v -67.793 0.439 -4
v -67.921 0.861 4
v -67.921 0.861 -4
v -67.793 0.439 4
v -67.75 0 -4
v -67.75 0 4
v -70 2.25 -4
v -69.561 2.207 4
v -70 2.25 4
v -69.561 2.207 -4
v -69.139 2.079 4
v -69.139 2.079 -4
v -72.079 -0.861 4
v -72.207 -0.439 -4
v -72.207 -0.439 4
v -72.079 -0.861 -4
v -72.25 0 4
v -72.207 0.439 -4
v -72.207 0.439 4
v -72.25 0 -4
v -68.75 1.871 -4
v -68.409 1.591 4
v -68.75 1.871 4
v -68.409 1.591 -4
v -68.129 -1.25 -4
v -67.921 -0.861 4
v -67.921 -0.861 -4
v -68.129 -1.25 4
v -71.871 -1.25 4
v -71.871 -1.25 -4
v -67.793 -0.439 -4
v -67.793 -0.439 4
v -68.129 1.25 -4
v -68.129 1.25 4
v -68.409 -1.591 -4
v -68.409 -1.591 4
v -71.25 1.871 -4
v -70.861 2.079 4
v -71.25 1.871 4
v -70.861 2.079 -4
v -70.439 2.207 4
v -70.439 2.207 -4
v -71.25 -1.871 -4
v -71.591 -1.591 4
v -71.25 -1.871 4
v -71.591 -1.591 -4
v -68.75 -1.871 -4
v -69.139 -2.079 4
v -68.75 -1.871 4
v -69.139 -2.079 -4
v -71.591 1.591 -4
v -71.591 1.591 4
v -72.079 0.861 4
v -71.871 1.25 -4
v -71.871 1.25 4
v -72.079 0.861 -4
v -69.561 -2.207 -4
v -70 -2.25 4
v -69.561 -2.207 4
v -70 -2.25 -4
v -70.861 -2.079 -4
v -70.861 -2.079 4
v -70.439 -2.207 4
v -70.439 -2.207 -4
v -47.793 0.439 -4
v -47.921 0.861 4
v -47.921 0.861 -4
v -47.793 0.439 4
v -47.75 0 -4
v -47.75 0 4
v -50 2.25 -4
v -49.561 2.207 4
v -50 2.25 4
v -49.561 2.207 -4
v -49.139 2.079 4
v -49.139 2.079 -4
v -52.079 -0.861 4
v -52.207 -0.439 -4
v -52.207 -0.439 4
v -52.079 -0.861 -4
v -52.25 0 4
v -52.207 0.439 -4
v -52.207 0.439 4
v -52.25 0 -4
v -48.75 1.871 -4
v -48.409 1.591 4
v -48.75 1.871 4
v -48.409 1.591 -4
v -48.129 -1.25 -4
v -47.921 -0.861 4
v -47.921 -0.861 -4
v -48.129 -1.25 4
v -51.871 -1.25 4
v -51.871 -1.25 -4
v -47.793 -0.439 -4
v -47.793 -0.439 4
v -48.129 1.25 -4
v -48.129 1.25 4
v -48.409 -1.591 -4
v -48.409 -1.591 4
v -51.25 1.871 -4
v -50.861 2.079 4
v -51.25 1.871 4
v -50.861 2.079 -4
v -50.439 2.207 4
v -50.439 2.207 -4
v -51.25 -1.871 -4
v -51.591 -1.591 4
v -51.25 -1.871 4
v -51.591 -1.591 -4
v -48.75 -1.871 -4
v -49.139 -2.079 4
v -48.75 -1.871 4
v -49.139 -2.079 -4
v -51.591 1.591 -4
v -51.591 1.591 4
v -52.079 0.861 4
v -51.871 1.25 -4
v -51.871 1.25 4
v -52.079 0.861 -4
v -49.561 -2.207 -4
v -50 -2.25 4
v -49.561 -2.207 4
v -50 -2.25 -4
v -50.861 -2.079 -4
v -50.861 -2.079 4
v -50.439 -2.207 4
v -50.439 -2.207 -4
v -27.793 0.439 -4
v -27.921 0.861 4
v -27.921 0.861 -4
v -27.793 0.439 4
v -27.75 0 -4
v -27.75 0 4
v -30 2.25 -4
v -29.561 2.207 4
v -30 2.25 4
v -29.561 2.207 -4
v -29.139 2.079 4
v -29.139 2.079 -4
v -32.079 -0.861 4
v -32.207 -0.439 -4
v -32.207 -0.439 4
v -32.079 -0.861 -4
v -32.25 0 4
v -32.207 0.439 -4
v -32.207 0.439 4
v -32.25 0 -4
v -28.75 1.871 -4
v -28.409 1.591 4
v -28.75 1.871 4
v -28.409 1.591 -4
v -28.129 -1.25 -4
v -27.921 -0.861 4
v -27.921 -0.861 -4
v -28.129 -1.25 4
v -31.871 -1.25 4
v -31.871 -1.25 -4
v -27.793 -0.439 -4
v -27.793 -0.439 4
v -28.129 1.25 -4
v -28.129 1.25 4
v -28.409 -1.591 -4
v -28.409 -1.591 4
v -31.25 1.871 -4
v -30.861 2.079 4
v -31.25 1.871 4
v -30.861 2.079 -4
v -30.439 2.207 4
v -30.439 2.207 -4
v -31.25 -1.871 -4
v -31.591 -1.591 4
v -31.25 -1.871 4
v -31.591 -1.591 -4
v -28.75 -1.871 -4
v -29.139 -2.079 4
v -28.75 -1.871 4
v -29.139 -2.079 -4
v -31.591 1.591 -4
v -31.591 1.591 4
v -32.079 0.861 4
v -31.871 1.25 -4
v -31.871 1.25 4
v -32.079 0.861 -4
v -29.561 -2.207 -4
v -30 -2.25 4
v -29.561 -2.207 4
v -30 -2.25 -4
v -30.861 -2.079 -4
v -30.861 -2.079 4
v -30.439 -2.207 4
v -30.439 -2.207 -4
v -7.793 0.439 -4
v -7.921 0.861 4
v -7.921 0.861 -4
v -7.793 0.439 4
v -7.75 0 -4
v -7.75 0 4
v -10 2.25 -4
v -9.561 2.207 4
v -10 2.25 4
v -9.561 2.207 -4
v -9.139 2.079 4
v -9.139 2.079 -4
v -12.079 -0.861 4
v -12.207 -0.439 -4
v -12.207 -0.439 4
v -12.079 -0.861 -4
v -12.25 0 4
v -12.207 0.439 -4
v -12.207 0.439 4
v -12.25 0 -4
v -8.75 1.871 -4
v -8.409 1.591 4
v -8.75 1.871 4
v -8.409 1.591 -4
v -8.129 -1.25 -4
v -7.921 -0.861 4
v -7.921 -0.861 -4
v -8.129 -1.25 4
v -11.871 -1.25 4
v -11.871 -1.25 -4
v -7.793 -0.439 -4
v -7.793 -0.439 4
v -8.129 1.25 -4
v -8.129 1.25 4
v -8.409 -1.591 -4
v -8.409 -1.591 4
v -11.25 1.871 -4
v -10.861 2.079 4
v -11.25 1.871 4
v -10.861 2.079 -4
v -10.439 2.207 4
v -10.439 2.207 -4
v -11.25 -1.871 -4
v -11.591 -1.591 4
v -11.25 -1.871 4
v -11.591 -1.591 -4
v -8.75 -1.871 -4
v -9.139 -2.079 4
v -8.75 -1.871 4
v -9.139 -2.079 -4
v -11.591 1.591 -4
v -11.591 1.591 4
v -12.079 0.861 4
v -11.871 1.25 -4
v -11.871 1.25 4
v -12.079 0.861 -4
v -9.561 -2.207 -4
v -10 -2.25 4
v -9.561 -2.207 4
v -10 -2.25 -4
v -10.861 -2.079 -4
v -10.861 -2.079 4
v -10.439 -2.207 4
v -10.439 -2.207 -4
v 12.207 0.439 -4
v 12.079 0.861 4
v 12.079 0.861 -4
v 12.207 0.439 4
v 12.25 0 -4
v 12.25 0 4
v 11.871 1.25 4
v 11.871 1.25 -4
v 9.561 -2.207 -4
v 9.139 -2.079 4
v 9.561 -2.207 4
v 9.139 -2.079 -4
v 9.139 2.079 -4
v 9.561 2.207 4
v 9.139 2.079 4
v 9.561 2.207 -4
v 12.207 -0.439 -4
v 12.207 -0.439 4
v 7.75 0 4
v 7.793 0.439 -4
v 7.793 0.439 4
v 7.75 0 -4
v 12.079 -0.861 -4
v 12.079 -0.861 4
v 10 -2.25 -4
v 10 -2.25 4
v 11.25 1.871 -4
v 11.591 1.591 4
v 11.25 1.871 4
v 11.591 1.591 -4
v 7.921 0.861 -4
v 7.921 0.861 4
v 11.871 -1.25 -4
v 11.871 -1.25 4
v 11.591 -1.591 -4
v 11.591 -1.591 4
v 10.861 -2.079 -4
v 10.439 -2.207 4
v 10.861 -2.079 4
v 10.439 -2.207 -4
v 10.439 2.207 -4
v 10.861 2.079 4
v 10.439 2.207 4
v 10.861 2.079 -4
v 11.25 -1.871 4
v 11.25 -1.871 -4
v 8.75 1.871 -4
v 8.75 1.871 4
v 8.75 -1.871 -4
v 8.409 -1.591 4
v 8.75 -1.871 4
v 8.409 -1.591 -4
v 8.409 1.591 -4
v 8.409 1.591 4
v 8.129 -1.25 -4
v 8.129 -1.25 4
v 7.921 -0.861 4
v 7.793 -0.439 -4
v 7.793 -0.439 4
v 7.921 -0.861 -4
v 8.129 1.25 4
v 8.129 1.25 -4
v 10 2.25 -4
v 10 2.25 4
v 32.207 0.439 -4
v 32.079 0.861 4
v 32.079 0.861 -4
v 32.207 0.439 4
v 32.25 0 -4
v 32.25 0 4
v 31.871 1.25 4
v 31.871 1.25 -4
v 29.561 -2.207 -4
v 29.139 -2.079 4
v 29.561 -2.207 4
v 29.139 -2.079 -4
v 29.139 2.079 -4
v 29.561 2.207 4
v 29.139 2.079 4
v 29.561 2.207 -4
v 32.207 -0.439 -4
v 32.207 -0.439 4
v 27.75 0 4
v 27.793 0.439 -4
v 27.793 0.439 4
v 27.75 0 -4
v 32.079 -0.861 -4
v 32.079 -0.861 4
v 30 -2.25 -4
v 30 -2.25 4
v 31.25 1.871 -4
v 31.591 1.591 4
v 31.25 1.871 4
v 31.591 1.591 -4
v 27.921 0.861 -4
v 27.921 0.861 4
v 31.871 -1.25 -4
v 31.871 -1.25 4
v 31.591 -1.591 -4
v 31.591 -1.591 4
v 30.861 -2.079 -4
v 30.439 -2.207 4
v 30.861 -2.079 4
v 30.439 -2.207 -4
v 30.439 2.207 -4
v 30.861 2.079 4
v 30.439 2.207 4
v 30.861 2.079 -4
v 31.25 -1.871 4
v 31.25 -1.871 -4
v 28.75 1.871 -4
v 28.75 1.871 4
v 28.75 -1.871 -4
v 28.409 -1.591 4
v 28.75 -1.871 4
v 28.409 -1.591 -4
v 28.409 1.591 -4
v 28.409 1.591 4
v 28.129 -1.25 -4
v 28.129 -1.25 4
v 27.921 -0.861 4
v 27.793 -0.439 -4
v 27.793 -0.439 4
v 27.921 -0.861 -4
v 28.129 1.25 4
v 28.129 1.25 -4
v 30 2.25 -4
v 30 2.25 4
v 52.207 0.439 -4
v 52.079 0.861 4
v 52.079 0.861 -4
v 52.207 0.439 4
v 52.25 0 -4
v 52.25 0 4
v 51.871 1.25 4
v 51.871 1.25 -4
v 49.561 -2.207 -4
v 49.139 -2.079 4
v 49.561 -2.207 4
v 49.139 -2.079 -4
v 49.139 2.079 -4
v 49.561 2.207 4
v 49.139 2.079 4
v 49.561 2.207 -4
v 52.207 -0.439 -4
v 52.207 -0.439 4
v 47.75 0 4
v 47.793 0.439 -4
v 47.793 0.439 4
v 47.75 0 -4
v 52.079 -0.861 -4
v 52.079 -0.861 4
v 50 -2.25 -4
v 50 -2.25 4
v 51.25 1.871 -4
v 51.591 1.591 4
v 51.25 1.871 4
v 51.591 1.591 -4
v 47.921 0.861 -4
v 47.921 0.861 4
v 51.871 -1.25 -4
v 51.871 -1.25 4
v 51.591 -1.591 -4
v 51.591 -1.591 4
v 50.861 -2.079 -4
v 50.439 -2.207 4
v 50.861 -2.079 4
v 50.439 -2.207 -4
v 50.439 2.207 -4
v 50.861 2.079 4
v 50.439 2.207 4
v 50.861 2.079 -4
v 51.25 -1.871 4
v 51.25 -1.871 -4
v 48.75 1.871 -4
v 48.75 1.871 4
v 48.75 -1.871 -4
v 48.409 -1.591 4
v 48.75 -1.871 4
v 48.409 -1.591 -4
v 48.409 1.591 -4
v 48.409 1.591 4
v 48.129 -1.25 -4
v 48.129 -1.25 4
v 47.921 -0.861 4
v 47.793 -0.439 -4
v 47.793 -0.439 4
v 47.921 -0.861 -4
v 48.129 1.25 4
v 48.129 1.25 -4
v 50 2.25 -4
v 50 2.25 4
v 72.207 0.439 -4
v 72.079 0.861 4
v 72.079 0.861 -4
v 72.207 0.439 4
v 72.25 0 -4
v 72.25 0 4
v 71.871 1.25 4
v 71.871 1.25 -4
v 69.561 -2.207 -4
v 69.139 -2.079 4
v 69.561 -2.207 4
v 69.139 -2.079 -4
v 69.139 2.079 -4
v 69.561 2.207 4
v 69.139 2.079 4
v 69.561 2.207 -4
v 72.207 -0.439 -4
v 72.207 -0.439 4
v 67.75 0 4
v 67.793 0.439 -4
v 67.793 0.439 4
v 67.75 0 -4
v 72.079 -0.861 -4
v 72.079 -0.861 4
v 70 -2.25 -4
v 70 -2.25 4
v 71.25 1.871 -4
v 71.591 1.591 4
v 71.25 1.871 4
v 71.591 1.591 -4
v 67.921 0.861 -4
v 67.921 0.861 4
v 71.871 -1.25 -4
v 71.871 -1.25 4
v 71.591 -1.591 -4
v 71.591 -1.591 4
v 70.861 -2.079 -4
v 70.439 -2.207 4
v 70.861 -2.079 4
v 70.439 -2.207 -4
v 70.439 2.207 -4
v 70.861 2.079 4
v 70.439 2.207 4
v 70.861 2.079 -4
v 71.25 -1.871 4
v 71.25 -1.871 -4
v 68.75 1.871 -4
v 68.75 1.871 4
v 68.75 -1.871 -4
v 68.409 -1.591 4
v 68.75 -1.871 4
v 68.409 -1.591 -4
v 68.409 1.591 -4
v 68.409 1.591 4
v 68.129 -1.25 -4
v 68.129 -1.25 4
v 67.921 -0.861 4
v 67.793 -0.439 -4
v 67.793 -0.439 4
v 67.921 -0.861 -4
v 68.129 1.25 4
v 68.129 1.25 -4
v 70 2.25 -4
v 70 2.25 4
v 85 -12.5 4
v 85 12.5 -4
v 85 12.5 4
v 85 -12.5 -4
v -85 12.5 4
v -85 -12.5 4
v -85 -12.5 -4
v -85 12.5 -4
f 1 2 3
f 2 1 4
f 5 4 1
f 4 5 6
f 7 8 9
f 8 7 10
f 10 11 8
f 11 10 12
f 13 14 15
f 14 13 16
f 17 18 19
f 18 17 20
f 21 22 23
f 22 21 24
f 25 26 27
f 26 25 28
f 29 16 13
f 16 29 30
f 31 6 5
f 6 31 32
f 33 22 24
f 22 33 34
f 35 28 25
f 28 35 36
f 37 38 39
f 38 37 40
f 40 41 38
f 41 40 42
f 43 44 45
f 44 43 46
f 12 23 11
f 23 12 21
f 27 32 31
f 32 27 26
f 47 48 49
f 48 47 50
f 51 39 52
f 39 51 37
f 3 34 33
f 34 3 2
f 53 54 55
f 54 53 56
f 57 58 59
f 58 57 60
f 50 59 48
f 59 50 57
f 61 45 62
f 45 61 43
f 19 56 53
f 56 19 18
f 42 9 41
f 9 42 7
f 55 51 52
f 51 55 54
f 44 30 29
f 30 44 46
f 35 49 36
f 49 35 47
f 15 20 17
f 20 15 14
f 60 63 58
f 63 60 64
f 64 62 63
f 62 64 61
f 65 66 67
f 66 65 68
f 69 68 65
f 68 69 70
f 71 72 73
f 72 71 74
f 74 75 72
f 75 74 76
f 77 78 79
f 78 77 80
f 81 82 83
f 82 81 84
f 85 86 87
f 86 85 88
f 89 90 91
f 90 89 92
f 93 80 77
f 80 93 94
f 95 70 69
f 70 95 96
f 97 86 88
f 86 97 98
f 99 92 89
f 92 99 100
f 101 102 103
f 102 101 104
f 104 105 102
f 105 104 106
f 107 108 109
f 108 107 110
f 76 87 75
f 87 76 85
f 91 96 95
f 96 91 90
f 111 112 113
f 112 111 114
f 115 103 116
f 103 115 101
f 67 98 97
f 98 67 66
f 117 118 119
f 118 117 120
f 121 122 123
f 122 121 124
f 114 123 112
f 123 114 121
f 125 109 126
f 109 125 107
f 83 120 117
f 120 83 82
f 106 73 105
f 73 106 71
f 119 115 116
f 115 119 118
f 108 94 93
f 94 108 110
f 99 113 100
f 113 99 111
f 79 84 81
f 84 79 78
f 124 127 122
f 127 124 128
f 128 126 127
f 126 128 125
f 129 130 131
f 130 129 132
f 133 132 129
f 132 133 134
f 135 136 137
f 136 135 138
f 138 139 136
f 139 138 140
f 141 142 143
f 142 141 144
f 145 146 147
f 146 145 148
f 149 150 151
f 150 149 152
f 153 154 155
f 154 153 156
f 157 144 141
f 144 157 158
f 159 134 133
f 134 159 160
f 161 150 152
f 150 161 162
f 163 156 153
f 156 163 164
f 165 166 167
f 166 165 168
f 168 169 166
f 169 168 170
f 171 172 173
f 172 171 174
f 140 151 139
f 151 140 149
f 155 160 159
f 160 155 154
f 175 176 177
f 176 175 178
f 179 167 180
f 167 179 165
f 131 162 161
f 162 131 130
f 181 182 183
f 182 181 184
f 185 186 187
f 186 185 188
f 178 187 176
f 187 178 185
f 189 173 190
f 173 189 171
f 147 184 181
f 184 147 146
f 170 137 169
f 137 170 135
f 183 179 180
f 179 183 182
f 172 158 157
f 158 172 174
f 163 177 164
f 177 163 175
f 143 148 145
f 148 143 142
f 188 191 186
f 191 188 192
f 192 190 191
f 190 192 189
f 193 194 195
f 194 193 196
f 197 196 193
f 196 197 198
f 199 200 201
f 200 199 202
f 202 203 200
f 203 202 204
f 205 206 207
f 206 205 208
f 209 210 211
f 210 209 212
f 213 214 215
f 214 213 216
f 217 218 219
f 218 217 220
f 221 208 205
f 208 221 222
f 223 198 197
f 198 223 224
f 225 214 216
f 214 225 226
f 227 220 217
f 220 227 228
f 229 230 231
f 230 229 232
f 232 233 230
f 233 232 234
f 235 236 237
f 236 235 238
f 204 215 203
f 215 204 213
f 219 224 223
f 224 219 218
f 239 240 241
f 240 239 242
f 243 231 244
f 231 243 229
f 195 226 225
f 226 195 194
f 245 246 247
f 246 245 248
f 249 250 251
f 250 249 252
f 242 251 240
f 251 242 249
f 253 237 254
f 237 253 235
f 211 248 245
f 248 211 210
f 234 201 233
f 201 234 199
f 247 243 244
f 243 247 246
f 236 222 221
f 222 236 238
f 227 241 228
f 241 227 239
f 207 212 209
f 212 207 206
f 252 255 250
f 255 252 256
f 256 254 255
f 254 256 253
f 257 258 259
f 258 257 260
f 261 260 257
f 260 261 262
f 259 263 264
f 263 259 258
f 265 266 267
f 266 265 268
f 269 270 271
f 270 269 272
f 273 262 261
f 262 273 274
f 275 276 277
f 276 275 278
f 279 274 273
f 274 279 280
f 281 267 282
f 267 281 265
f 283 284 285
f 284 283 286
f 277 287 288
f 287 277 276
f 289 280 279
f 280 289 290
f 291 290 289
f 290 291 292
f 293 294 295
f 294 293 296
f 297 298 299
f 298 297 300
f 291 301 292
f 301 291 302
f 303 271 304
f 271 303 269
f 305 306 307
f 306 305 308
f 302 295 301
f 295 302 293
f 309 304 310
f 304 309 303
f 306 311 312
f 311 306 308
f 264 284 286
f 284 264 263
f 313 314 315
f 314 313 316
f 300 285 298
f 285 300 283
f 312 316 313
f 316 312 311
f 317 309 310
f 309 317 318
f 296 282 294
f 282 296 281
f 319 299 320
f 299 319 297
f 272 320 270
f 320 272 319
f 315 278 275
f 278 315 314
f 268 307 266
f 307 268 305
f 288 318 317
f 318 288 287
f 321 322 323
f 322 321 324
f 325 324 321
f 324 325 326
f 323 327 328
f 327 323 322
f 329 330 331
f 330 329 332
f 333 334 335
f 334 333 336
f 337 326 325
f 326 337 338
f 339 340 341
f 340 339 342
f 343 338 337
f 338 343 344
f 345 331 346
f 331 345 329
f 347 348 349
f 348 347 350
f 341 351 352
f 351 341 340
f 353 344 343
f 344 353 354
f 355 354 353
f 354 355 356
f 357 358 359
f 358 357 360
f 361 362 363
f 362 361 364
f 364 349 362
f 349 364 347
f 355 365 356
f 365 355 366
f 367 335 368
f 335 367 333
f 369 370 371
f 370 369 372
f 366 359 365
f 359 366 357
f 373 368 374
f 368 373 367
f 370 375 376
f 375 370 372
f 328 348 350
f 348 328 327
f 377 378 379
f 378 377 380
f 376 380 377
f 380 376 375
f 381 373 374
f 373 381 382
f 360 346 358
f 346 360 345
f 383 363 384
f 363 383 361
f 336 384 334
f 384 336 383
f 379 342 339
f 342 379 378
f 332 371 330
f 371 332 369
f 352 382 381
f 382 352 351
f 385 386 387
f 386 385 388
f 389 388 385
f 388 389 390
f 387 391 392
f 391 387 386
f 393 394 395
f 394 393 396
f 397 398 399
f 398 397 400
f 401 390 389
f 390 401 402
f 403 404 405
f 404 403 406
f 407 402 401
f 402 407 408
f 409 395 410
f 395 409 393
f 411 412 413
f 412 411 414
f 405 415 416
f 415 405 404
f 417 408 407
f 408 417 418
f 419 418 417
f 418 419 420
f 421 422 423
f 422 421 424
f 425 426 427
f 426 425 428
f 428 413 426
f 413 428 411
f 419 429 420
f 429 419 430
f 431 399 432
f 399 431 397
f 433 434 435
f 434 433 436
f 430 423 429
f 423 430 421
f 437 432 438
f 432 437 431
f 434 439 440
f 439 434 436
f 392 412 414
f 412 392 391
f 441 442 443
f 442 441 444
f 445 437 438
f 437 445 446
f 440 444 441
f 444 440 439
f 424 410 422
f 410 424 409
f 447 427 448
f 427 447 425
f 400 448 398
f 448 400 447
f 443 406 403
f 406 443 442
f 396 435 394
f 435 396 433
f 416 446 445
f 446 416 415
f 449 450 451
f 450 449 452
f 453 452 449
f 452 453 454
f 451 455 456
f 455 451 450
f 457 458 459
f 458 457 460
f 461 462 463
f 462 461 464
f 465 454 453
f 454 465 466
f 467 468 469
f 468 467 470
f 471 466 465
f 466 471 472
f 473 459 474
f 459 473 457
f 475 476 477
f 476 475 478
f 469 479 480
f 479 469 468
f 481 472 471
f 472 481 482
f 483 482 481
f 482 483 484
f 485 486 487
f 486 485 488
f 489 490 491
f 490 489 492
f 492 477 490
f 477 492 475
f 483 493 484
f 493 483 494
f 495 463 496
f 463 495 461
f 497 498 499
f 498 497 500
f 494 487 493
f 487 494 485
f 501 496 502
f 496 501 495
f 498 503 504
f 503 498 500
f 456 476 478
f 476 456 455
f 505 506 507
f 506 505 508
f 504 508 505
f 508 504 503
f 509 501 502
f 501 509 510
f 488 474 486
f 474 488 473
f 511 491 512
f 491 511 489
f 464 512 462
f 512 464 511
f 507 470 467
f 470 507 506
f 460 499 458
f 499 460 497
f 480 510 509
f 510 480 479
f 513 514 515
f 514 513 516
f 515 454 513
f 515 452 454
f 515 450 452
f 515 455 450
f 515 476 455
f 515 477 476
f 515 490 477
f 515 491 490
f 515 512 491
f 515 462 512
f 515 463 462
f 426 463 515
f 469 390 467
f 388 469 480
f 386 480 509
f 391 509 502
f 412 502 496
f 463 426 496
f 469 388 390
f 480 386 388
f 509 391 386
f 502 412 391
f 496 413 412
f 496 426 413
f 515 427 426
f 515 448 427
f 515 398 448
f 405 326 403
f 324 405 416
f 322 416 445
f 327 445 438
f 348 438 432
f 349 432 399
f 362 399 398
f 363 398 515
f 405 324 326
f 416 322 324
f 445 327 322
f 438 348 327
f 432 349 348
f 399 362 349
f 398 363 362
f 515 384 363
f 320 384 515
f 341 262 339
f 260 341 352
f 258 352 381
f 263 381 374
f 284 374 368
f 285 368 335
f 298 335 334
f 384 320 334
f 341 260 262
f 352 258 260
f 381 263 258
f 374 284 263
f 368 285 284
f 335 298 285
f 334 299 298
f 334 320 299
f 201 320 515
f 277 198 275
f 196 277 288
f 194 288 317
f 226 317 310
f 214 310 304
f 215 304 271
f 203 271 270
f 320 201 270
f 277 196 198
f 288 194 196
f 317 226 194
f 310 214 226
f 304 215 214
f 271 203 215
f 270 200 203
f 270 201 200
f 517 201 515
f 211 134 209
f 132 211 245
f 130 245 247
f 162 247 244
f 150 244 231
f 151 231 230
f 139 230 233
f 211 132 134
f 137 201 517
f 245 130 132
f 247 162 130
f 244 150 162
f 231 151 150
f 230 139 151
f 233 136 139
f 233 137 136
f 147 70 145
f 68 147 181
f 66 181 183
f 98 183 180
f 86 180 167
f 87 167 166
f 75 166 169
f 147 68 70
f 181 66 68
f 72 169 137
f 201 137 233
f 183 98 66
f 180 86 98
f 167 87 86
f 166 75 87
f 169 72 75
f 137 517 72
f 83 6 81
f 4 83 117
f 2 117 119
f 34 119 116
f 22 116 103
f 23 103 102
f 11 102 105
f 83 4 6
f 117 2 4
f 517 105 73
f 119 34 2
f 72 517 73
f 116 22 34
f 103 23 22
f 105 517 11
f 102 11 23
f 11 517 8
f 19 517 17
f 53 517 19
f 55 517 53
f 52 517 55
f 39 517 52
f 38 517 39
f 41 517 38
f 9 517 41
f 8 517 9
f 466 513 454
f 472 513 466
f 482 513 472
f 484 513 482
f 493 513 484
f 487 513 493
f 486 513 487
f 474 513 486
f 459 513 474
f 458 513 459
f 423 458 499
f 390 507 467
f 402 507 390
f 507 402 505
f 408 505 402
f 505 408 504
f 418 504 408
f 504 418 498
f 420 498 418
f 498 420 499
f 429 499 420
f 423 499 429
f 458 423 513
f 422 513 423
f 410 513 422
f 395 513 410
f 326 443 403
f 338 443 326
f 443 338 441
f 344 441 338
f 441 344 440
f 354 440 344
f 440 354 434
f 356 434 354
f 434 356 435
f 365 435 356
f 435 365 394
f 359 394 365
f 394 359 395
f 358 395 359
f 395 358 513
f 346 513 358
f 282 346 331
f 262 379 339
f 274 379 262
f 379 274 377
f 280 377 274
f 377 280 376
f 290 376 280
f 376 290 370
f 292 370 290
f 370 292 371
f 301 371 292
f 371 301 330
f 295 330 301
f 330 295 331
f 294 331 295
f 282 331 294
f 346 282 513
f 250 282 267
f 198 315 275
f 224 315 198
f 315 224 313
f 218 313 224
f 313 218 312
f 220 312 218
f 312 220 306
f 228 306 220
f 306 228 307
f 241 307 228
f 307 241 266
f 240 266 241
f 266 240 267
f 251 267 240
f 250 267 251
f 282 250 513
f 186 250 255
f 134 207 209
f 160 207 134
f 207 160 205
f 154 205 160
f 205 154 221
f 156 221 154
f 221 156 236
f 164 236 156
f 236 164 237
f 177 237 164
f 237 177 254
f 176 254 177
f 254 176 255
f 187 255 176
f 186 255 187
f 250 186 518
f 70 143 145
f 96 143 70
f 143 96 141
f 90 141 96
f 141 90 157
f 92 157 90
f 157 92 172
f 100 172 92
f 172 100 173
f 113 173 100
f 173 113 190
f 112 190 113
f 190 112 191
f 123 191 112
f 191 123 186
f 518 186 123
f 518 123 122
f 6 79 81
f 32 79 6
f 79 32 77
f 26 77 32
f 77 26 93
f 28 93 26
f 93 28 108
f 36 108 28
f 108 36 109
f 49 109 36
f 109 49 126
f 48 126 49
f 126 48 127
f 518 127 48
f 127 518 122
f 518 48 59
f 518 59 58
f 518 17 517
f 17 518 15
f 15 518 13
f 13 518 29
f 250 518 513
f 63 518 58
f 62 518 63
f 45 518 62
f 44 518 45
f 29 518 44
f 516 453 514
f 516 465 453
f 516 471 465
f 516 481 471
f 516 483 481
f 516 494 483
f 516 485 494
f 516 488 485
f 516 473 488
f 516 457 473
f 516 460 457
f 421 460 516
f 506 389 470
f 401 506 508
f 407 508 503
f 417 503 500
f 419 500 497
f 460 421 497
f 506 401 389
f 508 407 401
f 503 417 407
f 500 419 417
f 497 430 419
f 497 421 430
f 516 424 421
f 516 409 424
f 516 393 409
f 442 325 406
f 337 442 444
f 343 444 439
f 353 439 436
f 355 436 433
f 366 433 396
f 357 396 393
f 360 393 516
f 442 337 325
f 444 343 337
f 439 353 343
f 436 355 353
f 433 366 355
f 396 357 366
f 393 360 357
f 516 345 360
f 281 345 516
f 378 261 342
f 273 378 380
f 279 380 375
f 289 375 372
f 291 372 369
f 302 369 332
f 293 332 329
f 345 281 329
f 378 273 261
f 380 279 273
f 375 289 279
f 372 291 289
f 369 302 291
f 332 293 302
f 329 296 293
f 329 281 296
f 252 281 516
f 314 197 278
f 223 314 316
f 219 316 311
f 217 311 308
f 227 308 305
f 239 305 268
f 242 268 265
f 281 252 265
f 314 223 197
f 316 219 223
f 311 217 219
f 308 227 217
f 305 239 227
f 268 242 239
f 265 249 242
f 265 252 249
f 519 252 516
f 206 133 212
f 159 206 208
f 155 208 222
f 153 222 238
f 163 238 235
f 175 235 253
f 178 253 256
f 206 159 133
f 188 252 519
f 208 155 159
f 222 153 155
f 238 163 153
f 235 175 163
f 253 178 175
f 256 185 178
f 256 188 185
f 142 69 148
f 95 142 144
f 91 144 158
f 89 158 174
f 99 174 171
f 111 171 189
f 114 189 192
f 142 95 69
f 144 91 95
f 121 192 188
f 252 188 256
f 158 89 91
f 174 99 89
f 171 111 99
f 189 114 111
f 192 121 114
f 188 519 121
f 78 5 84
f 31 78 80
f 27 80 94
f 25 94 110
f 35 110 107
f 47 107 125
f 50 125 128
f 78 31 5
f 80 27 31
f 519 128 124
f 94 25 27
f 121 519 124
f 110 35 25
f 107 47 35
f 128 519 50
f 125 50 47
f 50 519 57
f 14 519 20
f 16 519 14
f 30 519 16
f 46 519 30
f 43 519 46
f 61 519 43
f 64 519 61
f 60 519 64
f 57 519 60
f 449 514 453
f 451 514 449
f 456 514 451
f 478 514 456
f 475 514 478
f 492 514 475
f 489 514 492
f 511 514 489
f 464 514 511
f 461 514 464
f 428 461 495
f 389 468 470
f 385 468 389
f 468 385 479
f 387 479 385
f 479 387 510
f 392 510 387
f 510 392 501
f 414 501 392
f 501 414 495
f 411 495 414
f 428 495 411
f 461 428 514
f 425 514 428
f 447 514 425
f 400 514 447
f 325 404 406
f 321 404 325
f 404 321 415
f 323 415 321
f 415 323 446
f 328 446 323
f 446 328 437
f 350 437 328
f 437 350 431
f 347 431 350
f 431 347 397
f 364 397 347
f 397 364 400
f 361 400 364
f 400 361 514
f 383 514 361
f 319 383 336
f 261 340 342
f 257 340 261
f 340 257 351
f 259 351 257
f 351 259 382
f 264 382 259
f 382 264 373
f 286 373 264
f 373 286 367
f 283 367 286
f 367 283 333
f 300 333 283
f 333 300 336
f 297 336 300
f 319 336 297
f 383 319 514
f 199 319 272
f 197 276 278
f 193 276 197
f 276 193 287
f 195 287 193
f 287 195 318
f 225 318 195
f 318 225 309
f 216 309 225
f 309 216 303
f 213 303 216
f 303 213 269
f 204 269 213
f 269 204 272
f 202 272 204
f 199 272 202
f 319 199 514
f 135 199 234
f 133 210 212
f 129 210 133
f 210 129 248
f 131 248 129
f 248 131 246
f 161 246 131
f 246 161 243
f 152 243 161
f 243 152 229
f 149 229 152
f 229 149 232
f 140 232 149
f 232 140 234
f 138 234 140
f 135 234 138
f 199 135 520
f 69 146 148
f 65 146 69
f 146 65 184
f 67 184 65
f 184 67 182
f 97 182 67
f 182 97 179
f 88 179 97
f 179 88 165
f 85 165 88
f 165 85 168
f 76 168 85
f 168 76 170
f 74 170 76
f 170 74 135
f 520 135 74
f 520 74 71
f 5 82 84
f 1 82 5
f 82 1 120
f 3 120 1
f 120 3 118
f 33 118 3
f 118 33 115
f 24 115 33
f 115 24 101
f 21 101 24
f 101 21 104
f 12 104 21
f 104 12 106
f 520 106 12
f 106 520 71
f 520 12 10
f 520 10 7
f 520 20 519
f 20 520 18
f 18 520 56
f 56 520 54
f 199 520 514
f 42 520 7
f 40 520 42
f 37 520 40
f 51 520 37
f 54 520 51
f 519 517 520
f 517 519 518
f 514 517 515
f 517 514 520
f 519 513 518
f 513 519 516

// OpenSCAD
$fn = 32;

// ----------------------------------------------------------------------
// Hole bar, 8 x Ø4.5
// row layout, 15 mm edge offset
// ----------------------------------------------------------------------

// --- parameters (mm) ---
bar_w = 25;    // bar width (Y)
bar_t = 8;     // bar thickness (Z)
holes = 8;     // holes per row
hole_d = 4.5;  // hole diameter
edge = 15;     // offset from the bar end to the first hole
pitch = 20;    // pitch between neighbouring holes

// --- derived feature positions (mm) ---
span = (holes - 1) * pitch;   // = 140   distance between the end holes
bar_l = span + 2 * edge;      // = 170   overall bar length
start_x = -bar_l / 2 + edge;  // = -70   X of the first hole
feature_centers = [
  [start_x + 0 * pitch, 0],
  [start_x + 1 * pitch, 0],
  [start_x + 2 * pitch, 0],
  [start_x + 3 * pitch, 0],
  [start_x + 4 * pitch, 0],
  [start_x + 5 * pitch, 0],
  [start_x + 6 * pitch, 0],
  [start_x + 7 * pitch, 0]
];   // hole centres of the first row

// bar with one row of holes, drilled from feature_centers
difference() {
  translate([-bar_l / 2, -bar_w / 2, -bar_t / 2]) cube([bar_l, bar_w, bar_t]);
  for (centre = feature_centers)
    translate([centre[0], centre[1], 0])
      cylinder(d = hole_d, h = bar_t + 2, center = true);
}
